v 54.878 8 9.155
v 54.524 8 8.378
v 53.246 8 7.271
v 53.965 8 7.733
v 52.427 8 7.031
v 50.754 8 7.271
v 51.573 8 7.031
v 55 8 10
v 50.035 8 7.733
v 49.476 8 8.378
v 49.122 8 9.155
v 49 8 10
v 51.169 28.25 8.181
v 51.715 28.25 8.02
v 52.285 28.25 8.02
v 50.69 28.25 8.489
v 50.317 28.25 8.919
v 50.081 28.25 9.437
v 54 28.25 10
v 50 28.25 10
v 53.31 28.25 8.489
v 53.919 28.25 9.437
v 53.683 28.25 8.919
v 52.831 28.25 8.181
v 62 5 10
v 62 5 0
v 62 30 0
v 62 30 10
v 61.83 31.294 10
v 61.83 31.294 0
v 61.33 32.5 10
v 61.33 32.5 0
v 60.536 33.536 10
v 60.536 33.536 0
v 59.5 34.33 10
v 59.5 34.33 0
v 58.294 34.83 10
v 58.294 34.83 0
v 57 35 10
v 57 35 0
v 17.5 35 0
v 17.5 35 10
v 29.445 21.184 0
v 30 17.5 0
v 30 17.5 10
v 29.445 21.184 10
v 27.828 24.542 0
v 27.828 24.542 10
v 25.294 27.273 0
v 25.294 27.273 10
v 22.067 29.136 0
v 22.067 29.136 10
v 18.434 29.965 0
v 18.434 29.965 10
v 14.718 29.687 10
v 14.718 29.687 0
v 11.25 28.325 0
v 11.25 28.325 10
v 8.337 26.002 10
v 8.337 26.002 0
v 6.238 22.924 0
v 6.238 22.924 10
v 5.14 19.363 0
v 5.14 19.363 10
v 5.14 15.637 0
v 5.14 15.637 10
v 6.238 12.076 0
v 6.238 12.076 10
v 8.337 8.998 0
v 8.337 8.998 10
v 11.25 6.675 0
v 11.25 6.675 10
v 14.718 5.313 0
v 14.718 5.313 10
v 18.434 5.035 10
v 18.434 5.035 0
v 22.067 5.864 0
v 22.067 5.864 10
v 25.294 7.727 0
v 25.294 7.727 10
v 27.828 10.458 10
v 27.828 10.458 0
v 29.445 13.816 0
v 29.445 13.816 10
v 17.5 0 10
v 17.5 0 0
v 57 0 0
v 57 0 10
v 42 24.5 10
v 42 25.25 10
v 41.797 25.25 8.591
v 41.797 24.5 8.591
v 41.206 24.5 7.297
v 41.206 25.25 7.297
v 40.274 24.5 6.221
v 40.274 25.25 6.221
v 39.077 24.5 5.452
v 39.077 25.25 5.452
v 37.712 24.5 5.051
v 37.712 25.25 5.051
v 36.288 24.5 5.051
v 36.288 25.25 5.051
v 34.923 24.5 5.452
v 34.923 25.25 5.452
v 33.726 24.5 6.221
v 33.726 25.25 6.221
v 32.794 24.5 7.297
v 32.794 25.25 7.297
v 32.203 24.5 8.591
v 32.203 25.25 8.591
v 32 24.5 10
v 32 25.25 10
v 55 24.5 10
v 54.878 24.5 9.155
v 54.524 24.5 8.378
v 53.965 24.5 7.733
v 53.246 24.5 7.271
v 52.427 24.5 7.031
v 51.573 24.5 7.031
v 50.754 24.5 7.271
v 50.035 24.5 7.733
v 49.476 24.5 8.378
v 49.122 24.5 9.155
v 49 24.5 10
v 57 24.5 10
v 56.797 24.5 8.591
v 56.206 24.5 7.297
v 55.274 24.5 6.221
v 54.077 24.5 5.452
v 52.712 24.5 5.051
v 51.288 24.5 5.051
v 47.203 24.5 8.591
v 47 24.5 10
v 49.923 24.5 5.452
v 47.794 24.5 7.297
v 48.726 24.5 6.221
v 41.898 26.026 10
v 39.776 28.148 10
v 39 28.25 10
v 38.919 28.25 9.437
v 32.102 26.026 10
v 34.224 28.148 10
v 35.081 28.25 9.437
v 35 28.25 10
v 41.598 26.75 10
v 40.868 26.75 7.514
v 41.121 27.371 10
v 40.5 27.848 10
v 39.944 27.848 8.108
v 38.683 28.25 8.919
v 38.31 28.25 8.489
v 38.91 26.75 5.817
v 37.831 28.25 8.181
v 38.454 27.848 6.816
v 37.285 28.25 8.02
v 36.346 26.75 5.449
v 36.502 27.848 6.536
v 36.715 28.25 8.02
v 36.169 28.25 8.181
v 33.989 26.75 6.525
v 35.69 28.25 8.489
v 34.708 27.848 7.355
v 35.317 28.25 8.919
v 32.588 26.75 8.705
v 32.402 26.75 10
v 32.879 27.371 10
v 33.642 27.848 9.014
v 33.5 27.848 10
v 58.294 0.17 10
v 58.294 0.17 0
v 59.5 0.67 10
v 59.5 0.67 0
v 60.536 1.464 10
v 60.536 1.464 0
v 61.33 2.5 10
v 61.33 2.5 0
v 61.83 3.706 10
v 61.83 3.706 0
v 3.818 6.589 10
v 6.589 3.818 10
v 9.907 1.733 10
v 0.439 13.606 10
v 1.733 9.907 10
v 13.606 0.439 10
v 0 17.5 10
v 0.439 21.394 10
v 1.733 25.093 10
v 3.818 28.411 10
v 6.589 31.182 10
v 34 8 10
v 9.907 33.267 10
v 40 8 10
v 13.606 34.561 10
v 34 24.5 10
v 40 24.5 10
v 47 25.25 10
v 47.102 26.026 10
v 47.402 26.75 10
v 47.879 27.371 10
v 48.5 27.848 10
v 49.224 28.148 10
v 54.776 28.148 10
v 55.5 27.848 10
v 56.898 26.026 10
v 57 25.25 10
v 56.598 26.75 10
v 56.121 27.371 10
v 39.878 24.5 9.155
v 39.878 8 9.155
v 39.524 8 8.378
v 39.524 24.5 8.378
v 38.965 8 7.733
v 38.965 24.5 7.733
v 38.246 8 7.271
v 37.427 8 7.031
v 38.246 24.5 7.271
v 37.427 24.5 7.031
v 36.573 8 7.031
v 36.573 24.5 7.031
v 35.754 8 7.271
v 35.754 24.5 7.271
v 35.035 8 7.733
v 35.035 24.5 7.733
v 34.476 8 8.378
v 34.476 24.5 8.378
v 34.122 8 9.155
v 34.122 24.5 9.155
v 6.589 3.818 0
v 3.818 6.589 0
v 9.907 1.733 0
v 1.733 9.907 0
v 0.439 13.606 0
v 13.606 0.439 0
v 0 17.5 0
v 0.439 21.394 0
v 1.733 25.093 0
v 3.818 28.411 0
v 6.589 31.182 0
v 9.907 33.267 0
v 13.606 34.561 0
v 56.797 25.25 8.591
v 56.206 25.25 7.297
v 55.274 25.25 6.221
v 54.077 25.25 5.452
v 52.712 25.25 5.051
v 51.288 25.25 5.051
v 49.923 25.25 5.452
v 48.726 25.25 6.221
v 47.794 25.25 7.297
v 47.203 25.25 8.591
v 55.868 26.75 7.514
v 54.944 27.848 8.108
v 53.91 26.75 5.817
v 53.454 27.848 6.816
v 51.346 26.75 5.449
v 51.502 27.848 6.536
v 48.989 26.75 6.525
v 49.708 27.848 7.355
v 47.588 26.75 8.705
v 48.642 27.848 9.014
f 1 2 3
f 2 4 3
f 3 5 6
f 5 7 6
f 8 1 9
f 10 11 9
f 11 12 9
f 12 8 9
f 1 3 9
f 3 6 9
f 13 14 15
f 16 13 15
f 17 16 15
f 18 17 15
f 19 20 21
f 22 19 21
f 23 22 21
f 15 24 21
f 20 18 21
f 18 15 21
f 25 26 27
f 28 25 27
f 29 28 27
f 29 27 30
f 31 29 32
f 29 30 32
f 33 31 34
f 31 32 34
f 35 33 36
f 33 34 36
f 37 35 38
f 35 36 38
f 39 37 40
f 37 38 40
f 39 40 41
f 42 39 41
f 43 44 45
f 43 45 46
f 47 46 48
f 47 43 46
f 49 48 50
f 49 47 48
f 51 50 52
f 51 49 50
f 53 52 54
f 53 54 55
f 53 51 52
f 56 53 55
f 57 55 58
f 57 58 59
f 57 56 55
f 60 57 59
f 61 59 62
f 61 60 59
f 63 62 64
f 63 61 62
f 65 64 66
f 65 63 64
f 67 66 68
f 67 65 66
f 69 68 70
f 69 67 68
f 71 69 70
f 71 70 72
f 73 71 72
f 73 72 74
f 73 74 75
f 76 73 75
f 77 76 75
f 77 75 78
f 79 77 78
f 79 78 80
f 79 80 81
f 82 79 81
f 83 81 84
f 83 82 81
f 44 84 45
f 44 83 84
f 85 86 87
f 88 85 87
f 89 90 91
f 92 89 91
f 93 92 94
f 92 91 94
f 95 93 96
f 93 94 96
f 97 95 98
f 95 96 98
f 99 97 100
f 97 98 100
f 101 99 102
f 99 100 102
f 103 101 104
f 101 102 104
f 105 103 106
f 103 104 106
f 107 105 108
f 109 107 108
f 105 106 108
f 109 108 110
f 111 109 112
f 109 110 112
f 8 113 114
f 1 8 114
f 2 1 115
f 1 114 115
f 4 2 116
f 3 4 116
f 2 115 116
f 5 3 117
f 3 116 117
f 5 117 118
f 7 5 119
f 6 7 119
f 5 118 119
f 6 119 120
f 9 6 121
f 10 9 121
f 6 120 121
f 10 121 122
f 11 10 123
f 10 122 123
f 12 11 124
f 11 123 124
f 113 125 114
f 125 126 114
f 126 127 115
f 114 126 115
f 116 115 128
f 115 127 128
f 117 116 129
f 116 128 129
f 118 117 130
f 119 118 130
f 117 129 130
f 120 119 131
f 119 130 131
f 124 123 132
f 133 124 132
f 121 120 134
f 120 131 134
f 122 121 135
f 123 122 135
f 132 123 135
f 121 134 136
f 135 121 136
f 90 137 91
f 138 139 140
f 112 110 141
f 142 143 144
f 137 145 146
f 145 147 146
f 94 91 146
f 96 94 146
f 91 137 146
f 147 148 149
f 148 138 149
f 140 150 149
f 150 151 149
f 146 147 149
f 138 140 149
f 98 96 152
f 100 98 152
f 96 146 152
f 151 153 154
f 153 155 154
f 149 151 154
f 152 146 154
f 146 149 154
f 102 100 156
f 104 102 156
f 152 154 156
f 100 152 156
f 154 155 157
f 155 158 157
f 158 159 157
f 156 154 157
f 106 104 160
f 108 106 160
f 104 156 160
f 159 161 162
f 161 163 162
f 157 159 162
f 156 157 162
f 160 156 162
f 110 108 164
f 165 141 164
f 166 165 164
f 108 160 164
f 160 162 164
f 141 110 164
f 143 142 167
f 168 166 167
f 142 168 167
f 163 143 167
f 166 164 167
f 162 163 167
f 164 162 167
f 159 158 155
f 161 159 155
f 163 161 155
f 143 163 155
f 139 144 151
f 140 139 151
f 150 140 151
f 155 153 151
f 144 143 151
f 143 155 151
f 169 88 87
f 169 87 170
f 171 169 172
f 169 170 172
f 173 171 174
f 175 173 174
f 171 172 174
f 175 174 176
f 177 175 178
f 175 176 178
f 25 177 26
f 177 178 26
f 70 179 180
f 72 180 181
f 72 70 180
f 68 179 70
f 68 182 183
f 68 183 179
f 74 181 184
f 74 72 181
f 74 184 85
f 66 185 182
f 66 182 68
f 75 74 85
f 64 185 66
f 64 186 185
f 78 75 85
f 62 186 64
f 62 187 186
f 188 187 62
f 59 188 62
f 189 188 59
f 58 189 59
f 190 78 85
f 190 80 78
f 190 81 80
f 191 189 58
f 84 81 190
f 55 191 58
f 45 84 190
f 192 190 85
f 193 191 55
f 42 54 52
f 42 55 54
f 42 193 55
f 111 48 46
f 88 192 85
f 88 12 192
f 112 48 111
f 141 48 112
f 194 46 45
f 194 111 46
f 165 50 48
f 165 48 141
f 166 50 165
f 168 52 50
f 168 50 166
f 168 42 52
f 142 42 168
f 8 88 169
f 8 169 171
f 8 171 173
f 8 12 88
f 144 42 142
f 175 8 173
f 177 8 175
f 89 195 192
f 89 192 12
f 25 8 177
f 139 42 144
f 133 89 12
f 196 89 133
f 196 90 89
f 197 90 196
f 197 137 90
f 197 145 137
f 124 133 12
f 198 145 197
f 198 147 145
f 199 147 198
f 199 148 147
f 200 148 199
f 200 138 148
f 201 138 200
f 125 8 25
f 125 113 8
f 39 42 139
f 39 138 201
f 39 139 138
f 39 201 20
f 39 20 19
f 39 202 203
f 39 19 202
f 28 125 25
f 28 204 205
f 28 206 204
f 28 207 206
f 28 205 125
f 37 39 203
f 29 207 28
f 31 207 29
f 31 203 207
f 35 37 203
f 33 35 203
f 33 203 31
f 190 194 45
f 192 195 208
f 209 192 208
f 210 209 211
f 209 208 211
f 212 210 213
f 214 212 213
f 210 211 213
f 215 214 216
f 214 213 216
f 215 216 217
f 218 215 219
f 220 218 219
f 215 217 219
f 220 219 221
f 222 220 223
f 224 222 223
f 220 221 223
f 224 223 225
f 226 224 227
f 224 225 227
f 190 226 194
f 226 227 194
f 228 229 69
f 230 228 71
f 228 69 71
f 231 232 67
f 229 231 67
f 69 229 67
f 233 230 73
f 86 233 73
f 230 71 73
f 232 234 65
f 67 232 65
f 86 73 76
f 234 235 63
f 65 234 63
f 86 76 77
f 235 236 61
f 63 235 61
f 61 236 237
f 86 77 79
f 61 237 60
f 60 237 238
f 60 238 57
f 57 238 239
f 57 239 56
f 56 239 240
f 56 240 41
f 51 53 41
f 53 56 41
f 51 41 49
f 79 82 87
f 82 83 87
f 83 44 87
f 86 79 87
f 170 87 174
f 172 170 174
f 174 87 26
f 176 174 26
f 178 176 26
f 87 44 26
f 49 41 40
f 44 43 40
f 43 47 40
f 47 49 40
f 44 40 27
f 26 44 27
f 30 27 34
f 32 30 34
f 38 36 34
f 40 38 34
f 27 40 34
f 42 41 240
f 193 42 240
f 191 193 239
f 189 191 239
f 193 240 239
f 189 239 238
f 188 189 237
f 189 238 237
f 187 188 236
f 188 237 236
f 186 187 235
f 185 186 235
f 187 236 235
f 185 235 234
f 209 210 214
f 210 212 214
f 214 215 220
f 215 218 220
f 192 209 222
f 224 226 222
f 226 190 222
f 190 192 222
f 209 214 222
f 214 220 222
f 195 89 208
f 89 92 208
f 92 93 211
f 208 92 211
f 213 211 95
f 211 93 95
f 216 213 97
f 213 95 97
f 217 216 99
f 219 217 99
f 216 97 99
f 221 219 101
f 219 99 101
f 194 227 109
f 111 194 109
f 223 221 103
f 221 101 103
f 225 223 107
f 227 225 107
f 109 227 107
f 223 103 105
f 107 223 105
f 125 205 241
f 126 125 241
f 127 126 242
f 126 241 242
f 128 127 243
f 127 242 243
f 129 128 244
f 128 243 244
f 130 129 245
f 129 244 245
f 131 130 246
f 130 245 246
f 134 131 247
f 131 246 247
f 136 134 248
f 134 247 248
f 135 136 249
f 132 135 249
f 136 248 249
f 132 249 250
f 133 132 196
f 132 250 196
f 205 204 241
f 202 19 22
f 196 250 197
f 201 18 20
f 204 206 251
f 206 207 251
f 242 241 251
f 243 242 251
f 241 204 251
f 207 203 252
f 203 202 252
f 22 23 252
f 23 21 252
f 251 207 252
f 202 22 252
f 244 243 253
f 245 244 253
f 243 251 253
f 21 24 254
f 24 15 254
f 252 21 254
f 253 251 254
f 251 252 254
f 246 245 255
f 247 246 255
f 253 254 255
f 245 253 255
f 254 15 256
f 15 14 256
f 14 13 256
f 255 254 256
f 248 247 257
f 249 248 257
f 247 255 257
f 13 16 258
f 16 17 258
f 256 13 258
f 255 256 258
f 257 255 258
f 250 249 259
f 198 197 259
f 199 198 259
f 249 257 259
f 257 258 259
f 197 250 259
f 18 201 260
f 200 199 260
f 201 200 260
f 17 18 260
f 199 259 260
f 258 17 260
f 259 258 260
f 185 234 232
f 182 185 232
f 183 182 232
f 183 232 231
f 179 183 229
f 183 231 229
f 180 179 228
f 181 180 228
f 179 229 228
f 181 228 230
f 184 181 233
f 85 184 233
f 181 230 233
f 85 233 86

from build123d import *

# Parameters (mm, degrees)
F0_R     = 12.5
F1_DEPTH = 10


with BuildPart() as f1:
    # F0 (on Top) → F1 (new body)
    with BuildSketch(Plane.XY):
        with BuildLine():
            ThreePointArc((0, 17.5), (5.125631, 5.125631), (17.5, 0))
            Line((17.5, 0), (57, 0))
            ThreePointArc((57, 0), (60.535534, 1.464466), (62, 5))
            Line((62, 5), (62, 30))
            ThreePointArc((62, 30), (60.535534, 33.535534), (57, 35))
            Line((57, 35), (17.5, 35))
            ThreePointArc((17.5, 35), (5.125631, 29.874369), (0, 17.5))
        make_face()
        with Locations((17.5, 17.5)):
            Circle(F0_R, mode=Mode.SUBTRACT)
    extrude(amount=F1_DEPTH)

    # F2 (on face) → F3 (revolve, cut)
    with BuildSketch(Plane.XY.offset(10)):
        with BuildLine():
            Line((37, 24.5), (37, 8))
            Line((37, 8), (40, 8))
            Line((40, 8), (40, 24.5))
            Line((40, 24.5), (42, 24.5))
            Line((42, 24.5), (42, 25.25))
            ThreePointArc((42, 25.25), (41.12132, 27.37132), (39, 28.25))
            Line((39, 28.25), (37, 28.25))
            Line((37, 28.25), (37, 24.5))
        make_face()
    revolve(axis=Axis((37, 16.25, 10), (0, 1, 0)), mode=Mode.SUBTRACT)

    # F2 (on face) → F4 (revolve, cut)
    with BuildSketch(Plane.XY.offset(10)):
        with BuildLine():
            Line((52, 24.5), (52, 8))
            Line((52, 8), (55, 8))
            Line((55, 8), (55, 24.5))
            Line((55, 24.5), (57, 24.5))
            Line((57, 24.5), (57, 25.25))
            ThreePointArc((57, 25.25), (56.12132, 27.37132), (54, 28.25))
            Line((54, 28.25), (52, 28.25))
            Line((52, 28.25), (52, 24.5))
        make_face()
    revolve(axis=Axis((52, 16.25, 10), (0, 1, 0)), mode=Mode.SUBTRACT)


solid = f1.part
